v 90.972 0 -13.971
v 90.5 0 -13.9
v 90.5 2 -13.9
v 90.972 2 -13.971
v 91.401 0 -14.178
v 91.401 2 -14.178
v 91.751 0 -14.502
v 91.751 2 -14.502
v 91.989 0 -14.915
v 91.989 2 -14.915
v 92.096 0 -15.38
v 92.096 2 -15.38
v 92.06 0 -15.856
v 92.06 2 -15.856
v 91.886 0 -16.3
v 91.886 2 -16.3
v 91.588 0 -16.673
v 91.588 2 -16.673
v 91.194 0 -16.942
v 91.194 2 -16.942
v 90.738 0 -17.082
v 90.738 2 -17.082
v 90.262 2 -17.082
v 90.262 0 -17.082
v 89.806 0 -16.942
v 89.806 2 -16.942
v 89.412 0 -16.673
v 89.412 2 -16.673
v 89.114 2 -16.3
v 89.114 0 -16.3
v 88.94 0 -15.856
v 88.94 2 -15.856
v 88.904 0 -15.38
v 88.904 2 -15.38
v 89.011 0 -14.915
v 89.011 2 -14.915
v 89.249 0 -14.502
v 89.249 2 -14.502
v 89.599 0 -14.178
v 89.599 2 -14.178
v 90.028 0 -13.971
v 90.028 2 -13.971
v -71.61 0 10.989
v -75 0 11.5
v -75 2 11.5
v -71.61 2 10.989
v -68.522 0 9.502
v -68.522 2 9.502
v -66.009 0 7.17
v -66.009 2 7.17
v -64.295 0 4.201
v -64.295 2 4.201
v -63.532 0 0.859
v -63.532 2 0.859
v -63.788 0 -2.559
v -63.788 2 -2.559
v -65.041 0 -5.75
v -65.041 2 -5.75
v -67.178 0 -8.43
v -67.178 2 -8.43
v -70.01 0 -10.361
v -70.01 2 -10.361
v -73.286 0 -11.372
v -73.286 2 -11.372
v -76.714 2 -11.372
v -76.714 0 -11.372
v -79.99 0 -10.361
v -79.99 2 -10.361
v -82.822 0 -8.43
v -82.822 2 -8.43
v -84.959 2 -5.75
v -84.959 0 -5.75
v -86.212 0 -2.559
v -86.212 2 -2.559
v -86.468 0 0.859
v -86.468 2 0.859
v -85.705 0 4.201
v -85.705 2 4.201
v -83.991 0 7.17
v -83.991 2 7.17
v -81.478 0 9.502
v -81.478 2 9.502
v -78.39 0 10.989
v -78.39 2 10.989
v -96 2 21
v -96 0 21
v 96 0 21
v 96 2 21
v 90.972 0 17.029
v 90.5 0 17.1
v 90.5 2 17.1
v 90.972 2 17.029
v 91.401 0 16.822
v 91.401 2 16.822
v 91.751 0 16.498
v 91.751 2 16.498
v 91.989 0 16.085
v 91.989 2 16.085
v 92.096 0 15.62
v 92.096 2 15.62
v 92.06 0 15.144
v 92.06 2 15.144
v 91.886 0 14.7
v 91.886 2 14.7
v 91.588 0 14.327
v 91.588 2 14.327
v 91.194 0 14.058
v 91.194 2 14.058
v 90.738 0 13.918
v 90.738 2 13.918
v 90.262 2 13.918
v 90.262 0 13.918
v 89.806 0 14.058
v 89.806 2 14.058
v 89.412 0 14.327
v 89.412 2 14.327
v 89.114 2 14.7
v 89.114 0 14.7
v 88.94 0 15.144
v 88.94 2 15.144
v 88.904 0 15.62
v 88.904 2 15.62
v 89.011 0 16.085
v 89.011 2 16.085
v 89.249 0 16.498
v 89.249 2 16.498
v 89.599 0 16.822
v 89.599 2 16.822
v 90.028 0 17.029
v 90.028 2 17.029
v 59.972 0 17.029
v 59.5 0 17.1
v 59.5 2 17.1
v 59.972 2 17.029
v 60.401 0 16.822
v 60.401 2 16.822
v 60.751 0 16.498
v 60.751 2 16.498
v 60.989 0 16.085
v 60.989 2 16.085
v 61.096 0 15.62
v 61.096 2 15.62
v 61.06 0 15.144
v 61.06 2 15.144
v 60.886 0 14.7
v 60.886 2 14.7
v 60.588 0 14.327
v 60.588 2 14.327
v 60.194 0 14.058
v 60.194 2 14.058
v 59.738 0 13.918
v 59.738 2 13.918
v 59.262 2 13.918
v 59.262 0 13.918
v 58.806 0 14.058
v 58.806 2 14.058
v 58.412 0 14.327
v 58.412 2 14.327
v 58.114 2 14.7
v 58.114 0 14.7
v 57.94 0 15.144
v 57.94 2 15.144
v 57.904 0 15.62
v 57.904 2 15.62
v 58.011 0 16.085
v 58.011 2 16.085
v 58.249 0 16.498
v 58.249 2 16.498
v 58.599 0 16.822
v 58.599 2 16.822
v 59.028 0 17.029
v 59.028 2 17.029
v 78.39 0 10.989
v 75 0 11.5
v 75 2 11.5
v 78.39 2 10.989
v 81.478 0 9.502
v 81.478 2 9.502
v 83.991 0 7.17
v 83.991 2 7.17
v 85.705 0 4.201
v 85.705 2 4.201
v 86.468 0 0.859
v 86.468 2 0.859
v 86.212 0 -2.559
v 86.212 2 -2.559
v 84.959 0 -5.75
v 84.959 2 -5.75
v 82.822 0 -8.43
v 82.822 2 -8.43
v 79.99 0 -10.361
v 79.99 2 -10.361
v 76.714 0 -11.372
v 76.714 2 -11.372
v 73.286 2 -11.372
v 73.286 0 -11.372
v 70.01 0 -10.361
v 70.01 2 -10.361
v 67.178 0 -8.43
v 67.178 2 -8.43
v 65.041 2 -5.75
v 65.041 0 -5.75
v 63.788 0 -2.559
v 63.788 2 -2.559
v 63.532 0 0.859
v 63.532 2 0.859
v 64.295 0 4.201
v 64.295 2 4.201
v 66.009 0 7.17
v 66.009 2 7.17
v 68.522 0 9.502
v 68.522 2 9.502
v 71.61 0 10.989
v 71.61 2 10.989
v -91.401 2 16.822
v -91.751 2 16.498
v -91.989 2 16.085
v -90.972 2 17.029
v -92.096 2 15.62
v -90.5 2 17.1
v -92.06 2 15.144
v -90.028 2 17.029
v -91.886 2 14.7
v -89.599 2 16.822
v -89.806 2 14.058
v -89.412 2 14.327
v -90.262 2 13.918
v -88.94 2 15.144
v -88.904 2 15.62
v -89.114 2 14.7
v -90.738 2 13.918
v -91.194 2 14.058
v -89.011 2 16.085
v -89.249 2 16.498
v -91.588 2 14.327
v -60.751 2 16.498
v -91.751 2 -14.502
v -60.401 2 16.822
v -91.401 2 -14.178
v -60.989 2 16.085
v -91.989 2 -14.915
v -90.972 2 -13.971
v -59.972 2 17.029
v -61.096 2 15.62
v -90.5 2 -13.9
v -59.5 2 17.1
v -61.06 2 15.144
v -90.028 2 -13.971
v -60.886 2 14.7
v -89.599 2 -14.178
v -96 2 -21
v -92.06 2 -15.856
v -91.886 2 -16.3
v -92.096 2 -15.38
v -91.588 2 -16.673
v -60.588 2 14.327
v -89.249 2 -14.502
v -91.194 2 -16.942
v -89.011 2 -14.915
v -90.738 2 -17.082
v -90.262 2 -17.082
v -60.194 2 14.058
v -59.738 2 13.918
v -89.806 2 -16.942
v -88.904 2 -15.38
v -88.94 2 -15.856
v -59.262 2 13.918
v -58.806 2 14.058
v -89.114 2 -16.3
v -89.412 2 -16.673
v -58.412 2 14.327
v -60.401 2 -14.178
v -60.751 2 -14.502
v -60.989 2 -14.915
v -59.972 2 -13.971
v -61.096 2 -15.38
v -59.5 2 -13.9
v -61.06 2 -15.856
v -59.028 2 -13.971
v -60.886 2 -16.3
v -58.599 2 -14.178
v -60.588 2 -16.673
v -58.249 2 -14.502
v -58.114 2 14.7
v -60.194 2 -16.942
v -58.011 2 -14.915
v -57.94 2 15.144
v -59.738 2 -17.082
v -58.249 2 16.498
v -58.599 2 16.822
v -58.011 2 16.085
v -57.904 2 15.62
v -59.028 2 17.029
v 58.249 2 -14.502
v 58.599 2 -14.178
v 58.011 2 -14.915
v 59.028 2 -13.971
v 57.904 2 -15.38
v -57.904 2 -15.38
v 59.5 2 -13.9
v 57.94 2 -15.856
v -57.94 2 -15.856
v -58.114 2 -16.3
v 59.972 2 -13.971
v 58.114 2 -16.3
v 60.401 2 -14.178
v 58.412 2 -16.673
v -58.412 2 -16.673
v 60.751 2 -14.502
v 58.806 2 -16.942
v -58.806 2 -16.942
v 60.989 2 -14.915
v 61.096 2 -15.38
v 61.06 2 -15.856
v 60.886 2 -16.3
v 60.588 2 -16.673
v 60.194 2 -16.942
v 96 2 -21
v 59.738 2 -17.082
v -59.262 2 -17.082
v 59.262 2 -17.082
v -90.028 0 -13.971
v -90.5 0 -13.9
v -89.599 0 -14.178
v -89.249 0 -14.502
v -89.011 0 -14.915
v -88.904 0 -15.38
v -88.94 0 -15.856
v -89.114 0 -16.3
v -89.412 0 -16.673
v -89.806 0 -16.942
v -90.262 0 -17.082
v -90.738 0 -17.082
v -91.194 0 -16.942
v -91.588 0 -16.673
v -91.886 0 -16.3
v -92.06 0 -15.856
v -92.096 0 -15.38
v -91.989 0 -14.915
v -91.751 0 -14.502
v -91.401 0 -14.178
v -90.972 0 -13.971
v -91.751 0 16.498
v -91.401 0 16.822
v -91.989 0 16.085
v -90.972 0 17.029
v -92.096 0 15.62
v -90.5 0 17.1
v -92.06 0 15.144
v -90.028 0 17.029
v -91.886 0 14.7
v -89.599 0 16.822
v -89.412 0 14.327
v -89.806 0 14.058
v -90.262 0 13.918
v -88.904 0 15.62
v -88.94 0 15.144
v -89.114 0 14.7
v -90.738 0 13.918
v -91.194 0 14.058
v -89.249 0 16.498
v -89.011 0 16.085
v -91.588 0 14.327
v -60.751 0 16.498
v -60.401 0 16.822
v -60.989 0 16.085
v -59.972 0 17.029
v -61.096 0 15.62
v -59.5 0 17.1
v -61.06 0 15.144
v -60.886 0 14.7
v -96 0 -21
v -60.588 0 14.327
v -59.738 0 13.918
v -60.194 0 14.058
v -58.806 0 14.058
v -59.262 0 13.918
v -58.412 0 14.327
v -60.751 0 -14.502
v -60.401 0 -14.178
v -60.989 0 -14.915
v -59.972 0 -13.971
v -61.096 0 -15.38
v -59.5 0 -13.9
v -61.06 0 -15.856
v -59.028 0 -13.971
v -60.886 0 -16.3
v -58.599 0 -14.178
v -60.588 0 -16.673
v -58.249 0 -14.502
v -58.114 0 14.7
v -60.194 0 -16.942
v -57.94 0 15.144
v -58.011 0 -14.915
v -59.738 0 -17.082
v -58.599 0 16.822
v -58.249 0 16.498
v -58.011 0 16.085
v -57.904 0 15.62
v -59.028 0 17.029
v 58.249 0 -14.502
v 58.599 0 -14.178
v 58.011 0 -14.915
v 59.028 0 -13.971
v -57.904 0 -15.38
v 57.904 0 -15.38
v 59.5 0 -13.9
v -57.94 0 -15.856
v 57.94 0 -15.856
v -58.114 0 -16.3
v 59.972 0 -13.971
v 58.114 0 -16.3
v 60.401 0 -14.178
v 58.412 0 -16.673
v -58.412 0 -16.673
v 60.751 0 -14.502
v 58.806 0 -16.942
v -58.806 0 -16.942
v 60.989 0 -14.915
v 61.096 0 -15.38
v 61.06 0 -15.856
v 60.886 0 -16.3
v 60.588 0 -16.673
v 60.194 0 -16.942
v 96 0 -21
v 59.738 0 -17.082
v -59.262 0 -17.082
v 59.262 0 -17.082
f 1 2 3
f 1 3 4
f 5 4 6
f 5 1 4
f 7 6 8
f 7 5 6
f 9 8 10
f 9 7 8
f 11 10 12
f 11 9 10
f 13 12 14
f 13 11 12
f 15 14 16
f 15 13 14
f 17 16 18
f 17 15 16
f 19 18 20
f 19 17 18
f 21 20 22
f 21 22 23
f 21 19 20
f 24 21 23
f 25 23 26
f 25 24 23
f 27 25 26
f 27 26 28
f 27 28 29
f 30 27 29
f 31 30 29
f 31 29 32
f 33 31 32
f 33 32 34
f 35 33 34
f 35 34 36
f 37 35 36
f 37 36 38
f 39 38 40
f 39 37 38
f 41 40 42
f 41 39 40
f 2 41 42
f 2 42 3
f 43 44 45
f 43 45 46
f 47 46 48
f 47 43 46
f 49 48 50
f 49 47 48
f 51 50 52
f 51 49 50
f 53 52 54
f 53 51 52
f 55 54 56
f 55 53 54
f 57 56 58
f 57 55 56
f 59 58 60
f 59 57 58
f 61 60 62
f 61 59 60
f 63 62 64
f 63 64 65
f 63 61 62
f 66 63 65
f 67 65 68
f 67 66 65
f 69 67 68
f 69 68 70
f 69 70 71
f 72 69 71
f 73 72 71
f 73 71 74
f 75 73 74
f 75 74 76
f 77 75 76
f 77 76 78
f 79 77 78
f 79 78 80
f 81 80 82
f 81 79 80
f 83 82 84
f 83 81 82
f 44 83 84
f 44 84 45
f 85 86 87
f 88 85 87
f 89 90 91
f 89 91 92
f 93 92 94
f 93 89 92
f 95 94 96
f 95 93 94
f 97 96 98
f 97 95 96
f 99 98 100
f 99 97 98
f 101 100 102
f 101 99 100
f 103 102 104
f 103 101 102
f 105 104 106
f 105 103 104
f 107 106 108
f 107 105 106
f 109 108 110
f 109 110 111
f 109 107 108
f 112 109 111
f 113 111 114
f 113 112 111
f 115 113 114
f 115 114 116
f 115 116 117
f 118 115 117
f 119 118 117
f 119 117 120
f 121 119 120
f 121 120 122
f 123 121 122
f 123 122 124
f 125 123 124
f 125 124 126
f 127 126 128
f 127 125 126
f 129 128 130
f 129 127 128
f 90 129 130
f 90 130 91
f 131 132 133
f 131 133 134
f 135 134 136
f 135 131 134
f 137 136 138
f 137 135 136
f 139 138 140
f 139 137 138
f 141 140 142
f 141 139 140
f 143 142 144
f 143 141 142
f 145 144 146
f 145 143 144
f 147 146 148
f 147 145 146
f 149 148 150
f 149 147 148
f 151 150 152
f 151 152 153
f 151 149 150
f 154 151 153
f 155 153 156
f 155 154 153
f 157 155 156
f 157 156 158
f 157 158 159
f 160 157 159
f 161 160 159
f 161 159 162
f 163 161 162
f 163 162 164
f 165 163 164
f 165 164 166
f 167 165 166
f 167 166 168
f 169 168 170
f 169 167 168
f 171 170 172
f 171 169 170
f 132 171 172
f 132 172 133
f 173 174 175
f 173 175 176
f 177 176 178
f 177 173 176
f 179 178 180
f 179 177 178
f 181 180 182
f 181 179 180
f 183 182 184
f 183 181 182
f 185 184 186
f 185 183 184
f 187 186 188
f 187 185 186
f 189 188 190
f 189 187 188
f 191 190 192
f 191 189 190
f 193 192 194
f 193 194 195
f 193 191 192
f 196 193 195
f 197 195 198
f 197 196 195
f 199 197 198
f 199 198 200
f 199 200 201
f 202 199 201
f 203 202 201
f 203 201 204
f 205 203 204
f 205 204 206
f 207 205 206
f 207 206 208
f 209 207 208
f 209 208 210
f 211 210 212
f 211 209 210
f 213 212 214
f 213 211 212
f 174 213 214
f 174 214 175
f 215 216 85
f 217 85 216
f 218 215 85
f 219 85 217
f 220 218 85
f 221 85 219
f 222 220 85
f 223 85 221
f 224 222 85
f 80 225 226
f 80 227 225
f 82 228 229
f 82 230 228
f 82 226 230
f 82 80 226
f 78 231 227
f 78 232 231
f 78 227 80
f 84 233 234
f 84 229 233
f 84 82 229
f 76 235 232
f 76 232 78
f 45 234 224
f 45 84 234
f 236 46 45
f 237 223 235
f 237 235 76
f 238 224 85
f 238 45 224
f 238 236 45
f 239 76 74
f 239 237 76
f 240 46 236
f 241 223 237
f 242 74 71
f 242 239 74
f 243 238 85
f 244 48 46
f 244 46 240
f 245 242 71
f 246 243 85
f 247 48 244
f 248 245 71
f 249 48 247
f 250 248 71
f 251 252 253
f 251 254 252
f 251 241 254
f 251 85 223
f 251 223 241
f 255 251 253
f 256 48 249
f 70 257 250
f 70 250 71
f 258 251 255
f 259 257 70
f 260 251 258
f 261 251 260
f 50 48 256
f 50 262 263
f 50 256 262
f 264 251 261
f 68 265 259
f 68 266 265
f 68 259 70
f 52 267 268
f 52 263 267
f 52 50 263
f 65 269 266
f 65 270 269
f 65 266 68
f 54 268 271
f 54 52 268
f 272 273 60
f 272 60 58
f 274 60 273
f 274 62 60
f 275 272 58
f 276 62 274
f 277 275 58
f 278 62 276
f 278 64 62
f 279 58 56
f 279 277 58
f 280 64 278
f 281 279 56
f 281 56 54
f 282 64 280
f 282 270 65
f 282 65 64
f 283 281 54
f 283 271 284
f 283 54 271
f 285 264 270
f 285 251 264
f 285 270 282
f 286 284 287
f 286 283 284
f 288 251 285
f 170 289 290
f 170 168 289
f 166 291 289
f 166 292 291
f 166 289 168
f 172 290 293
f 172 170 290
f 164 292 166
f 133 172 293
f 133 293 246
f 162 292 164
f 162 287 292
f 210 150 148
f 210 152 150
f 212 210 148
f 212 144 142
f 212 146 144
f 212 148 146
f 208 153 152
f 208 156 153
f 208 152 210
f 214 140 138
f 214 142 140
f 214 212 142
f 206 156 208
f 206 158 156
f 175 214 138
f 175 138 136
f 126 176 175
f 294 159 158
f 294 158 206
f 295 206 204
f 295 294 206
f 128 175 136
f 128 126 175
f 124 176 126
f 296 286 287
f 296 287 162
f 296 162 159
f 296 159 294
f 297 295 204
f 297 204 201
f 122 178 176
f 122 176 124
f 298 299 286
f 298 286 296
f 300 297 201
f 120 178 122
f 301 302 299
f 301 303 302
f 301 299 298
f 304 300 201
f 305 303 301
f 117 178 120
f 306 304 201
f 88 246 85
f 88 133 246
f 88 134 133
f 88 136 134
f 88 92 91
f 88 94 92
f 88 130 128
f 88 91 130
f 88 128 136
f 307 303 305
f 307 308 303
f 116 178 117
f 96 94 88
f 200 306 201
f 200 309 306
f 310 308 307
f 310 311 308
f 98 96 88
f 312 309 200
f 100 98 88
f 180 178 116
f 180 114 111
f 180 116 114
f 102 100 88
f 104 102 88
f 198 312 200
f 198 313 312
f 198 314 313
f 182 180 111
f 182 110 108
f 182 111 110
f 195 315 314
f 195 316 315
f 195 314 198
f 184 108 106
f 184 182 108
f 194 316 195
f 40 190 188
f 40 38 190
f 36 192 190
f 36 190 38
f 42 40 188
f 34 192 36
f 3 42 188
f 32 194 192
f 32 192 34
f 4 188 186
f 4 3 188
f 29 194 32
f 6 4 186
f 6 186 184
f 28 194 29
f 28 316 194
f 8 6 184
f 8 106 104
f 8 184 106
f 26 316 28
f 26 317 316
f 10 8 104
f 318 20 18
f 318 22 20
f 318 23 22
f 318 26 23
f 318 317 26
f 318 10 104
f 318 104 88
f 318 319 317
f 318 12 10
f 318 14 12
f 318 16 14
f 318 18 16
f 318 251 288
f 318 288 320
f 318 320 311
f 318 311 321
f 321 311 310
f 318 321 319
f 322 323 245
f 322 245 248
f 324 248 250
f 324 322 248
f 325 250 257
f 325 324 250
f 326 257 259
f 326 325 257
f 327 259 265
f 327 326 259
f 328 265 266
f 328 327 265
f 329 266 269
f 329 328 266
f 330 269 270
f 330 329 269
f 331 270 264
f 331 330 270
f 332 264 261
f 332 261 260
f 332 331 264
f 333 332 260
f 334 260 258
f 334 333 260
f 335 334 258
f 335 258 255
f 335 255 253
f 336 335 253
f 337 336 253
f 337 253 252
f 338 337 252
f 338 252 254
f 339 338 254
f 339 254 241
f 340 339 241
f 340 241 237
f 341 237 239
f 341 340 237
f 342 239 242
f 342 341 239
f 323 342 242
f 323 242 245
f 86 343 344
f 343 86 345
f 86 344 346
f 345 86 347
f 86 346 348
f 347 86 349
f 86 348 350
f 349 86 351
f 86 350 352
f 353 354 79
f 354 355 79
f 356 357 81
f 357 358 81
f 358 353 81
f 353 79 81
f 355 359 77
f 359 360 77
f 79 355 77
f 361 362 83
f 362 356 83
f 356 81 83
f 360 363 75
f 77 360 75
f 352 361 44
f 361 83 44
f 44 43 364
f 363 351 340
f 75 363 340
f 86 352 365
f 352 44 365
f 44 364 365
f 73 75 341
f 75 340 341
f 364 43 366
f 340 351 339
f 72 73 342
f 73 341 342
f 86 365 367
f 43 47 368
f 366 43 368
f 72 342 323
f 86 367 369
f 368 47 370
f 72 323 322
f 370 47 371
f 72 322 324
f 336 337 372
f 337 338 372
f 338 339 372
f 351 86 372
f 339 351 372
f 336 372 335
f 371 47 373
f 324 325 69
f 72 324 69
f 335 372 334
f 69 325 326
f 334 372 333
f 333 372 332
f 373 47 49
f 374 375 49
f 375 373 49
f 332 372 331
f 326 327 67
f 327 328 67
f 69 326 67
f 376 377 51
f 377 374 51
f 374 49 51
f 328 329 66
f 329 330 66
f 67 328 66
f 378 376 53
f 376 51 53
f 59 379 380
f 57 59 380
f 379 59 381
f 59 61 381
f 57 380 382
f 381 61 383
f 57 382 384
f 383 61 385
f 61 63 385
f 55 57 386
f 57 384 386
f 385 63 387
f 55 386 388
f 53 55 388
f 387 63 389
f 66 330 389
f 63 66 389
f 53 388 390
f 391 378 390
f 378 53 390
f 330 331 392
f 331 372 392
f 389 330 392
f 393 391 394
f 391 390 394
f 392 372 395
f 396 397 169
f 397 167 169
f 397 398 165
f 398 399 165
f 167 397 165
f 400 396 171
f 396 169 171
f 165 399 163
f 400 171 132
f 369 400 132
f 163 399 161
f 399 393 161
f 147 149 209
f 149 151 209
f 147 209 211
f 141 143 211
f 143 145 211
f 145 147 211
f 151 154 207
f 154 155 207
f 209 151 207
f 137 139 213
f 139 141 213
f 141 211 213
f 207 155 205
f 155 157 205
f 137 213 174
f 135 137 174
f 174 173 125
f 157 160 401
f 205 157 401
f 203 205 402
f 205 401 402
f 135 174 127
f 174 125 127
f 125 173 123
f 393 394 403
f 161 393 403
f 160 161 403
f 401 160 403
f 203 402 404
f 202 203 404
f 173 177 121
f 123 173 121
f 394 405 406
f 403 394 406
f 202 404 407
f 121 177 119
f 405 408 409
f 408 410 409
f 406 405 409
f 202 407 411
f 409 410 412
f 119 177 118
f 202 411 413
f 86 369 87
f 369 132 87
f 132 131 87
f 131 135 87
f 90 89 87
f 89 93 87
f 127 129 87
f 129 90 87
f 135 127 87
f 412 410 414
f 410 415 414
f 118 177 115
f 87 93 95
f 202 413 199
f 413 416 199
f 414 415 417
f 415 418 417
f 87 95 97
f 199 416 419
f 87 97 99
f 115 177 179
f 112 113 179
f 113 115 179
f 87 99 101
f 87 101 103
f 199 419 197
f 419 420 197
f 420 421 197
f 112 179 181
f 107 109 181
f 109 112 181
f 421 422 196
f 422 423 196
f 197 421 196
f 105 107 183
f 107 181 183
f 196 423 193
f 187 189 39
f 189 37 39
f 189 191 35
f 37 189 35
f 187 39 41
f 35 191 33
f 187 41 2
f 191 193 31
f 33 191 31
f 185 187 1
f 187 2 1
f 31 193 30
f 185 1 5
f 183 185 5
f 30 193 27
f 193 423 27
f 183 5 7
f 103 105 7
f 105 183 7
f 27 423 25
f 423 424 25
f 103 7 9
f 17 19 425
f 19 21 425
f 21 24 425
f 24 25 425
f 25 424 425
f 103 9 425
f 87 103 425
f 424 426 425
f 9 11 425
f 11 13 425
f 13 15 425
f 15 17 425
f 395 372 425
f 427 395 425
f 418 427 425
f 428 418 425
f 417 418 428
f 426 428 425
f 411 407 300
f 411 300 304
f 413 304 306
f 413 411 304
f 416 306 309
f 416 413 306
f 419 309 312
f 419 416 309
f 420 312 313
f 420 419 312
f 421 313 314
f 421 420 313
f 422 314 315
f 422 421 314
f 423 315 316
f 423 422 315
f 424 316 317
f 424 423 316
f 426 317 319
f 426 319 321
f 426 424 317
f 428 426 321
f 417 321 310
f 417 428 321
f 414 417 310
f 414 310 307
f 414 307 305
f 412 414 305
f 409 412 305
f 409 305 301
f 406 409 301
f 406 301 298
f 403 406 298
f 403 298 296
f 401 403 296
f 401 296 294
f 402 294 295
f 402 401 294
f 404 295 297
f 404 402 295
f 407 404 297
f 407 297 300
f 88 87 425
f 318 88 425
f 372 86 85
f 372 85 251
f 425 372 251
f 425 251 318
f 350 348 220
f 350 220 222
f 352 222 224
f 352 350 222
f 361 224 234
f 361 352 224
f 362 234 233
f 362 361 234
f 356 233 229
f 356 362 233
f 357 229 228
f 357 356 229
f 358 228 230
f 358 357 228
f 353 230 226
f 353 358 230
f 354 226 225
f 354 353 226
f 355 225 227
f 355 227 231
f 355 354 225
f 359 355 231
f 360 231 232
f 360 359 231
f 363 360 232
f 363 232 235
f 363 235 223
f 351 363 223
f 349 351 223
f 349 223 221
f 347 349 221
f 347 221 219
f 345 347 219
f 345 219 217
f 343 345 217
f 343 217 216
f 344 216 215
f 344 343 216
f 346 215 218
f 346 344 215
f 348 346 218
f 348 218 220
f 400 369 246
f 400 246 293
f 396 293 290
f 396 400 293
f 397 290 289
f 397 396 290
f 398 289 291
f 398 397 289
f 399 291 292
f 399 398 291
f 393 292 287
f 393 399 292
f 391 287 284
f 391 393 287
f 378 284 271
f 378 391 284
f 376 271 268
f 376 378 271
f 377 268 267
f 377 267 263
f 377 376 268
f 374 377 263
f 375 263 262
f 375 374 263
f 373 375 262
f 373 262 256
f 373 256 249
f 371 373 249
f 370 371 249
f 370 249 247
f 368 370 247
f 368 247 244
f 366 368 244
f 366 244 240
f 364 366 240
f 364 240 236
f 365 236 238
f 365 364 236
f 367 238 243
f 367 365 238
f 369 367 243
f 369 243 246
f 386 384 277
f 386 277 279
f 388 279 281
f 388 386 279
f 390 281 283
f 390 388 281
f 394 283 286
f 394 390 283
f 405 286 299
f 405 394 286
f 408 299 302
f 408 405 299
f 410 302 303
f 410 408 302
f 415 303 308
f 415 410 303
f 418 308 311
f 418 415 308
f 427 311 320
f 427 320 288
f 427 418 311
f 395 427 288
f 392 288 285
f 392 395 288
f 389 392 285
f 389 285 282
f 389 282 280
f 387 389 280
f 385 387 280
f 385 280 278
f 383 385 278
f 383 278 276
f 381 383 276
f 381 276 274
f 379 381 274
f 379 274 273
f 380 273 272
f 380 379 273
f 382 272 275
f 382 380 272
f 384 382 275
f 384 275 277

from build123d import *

# Parameters (mm, degrees)
SKETCH1_W           = 192
SKETCH1_H           = 42
SKETCH1_R           = 1.6
SKETCH1_R_2         = 11.5
BOSS_EXTRUDE1_DEPTH = 2


with BuildPart() as part:
    # Sketch1 → Boss-Extrude1 (new body)
    with BuildSketch(Plane(origin=(0, 0, 0), x_dir=(1, 0, 0), z_dir=(0, 1, 0))):
        Rectangle(SKETCH1_W, SKETCH1_H)
        with Locations(Location((-90.5, -15.5, 0), (0, 0, 270))):
            Circle(SKETCH1_R, mode=Mode.SUBTRACT)
        with Locations(Location((-59.5, -15.5, 0), (0, 0, 270))):
            Circle(SKETCH1_R, mode=Mode.SUBTRACT)
        with Locations(Location((59.5, -15.5, 0), (0, 0, 270))):
            Circle(SKETCH1_R, mode=Mode.SUBTRACT)
        with Locations(Location((90.5, -15.5, 0), (0, 0, 270))):
            Circle(SKETCH1_R, mode=Mode.SUBTRACT)
        with Locations(Location((-75, 0, 0), (0, 0, 270))):
            Circle(SKETCH1_R_2, mode=Mode.SUBTRACT)
        with Locations(Location((-90.5, 15.5, 0), (0, 0, 270))):
            Circle(SKETCH1_R, mode=Mode.SUBTRACT)
        with Locations(Location((-59.5, 15.5, 0), (0, 0, 270))):
            Circle(SKETCH1_R, mode=Mode.SUBTRACT)
        with Locations(Location((75, 0, 0), (0, 0, 270))):
            Circle(SKETCH1_R_2, mode=Mode.SUBTRACT)
        with Locations(Location((59.5, 15.5, 0), (0, 0, 270))):
            Circle(SKETCH1_R, mode=Mode.SUBTRACT)
        with Locations(Location((90.5, 15.5, 0), (0, 0, 270))):
            Circle(SKETCH1_R, mode=Mode.SUBTRACT)
    extrude(amount=BOSS_EXTRUDE1_DEPTH)


solid = part.part
